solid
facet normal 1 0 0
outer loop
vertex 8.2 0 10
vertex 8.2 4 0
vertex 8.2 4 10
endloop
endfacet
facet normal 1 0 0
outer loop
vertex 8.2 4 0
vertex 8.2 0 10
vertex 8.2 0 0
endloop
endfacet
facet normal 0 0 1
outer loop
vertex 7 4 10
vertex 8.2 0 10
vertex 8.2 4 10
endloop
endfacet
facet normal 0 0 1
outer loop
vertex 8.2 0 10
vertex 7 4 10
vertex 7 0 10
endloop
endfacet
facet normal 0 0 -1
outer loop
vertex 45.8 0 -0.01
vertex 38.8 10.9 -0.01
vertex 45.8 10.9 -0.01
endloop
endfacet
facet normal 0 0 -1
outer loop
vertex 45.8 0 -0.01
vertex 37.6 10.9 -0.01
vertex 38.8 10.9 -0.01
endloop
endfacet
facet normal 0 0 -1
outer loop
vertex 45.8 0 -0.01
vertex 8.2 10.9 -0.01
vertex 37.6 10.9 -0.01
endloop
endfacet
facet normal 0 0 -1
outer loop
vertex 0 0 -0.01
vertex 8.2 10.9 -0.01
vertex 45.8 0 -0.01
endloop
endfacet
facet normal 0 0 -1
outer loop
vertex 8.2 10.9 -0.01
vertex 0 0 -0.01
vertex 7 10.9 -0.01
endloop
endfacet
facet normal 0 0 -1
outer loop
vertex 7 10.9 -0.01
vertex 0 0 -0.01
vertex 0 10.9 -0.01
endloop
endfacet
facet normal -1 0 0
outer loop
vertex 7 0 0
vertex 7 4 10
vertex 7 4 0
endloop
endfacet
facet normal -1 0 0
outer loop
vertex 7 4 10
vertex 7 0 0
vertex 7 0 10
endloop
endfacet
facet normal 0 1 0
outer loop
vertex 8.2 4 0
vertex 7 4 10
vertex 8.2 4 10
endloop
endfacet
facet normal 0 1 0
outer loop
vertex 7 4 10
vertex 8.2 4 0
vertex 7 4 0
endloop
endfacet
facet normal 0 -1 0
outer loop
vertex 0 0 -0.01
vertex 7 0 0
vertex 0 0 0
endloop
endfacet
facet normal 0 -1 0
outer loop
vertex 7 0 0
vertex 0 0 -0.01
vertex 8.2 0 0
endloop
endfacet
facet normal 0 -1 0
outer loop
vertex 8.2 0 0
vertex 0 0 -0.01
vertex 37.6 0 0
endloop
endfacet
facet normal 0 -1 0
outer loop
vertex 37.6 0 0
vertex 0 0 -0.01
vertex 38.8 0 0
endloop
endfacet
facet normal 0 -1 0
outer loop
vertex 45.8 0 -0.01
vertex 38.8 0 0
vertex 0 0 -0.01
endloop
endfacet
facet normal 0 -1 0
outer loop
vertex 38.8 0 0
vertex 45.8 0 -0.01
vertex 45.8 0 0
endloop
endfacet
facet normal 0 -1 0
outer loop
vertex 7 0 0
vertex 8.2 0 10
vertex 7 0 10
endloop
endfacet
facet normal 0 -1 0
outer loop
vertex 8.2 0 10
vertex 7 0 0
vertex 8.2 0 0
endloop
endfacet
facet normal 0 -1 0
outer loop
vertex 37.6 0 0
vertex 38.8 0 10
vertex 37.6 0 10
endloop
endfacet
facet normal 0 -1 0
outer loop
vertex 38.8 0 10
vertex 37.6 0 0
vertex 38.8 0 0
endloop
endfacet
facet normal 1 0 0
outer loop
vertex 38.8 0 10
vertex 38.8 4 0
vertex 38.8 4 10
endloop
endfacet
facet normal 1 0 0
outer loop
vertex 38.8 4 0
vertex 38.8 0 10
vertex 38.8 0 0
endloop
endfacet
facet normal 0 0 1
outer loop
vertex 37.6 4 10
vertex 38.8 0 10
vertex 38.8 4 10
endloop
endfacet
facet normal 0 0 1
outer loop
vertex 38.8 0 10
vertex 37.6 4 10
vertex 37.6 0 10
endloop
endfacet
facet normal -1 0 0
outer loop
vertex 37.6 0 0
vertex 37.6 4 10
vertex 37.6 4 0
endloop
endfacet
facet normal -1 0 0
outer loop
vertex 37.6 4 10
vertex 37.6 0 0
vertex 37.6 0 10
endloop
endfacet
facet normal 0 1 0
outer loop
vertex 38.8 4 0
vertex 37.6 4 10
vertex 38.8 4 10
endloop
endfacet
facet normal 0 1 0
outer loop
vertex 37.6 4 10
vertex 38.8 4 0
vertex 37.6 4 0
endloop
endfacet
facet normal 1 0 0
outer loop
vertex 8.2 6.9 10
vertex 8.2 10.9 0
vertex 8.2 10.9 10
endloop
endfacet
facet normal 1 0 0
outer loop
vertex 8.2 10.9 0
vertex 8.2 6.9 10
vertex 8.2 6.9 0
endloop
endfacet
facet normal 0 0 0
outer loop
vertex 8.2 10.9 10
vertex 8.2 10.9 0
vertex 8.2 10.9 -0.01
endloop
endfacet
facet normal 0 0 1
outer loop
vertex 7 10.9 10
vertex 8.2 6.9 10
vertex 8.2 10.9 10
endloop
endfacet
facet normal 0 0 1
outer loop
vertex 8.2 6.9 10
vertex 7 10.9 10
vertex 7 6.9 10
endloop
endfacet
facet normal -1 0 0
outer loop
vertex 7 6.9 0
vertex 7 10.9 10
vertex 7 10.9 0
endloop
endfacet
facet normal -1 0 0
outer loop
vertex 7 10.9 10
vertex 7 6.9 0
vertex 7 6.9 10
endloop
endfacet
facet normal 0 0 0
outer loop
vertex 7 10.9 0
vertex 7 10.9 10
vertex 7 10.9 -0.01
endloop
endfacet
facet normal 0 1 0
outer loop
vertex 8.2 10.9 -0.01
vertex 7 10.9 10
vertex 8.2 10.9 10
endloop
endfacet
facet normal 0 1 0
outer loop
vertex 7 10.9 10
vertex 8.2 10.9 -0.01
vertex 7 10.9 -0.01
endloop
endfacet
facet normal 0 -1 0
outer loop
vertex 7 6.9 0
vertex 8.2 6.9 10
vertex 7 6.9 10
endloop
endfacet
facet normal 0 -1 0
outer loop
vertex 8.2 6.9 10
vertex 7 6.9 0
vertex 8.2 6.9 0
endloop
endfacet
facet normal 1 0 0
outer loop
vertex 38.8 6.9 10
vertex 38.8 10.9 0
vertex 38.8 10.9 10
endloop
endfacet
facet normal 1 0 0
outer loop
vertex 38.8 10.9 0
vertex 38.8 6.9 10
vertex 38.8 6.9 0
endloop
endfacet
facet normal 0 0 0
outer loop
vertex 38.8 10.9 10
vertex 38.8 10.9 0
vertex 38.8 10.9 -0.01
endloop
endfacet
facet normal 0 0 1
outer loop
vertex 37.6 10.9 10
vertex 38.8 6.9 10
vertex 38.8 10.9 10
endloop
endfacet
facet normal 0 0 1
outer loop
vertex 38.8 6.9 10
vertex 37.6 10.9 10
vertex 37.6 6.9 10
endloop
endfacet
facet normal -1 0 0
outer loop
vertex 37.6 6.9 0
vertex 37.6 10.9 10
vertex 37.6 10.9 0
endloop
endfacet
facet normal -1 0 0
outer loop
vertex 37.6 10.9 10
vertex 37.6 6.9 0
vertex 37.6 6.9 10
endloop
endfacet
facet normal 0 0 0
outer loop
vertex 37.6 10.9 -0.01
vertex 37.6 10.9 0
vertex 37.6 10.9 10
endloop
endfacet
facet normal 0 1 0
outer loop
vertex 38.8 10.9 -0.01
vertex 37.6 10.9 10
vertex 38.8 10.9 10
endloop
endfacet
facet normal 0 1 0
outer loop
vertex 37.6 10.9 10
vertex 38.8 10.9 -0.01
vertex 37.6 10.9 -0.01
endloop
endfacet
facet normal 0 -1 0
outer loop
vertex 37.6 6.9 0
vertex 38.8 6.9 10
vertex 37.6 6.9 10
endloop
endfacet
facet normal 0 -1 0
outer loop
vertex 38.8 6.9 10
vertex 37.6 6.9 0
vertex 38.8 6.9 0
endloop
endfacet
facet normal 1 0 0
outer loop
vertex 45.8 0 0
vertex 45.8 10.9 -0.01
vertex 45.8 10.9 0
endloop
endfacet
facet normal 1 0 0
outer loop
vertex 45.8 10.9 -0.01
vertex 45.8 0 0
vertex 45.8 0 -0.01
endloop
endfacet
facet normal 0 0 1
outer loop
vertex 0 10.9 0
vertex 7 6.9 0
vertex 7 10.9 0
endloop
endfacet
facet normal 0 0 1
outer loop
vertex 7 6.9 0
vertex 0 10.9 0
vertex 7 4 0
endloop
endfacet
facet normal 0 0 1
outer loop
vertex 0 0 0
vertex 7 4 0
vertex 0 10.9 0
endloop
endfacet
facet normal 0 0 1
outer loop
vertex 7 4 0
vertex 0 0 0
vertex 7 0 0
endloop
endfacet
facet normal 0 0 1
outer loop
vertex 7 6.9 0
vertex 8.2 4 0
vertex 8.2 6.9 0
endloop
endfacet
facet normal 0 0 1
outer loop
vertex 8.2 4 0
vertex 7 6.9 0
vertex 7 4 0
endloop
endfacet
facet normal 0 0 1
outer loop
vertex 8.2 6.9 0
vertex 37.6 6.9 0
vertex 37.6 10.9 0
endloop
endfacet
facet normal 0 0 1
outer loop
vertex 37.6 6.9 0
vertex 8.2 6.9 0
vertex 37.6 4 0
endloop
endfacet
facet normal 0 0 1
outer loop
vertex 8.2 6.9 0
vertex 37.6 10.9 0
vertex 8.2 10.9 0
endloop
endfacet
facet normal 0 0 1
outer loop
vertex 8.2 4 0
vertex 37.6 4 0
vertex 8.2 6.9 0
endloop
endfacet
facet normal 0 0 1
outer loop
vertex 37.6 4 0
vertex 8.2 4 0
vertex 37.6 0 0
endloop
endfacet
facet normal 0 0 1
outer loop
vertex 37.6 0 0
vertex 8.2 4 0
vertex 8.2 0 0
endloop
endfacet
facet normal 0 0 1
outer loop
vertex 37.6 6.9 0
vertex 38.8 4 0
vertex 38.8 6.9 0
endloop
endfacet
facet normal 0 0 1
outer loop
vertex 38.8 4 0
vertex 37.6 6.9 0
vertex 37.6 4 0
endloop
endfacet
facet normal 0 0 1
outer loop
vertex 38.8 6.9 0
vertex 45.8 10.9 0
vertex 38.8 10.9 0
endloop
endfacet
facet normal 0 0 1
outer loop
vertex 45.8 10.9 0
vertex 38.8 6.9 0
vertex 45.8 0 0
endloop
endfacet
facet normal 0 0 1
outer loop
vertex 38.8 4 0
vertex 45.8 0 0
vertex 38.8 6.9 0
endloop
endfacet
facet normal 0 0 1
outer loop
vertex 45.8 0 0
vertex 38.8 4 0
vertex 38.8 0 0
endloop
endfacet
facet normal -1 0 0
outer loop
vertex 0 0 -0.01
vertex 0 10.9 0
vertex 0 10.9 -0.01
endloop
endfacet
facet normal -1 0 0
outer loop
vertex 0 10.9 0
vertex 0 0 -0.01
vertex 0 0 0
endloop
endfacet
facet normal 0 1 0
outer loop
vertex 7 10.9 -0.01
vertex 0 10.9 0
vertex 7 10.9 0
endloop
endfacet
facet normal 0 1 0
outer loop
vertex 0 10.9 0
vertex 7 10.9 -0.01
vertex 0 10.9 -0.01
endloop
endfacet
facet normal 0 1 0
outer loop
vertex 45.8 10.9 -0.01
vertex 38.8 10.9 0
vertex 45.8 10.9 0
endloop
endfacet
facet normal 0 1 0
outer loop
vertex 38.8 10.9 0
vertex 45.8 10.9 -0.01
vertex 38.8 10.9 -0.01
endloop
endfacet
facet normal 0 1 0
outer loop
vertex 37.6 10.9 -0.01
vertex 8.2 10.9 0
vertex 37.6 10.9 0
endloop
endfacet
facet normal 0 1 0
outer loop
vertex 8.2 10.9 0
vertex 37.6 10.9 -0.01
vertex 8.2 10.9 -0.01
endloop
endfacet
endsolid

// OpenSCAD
// file: ../Base/Boxes.scad
// Fischertechnik Box Foundation
// Pre-designed Boxes

use <Constants.scad>

include <PlacementOptions.scad>

box190Width = 190;
box190Depth = 130;
box130Width = 130;
box130Depth = 95;

// Values are from an original ec3 box
topBottomDifference = 1.5;
outerHeight = 40;
innerHeight = 38.2;
baseThickness = outerHeight - innerHeight;
stackExcess = 5.7;
radius = 3.5;
wallThickness = 1.5;
tolerance = 0.2;
stackOffset = innerHeight - stackExcess;

boxUsageHeight = stackOffset;
boxWallThickness = wallThickness;
boxBaseThickness = baseThickness;
boxWebWidth = 3.0;

// getBoxWallThickness()
// Gets the wall thickness of a Fischertechnik Box
function getBoxWallThickness() = boxWallThickness;

// getBoxUsageHeight()
// Gets the usable height of a Fischertechnik box
function getBoxUsageHeight() = boxUsageHeight;

// getBoxInnerHeight()
// Gets the inner height of a Fischertechnik box, including the stack excess
function getBoxInnerHeight() = innerHeight;

// getBoxBaseThickness()
// Gets the thickness of the Fischertechnik box base.
function getBoxBaseThickness() = boxBaseThickness;

// getBoxWebWidth()
// Gets the width of a box web
function getBoxWebWidth() = boxWebWidth;

// getBox190Space()
// Gets the usable inner space of a Box 190 as an x/y-list
function getBox190Space() = [
    box190Width - 2*getBoxWallThickness() - topBottomDifference, 
    box190Depth - 2*getBoxWallThickness() - topBottomDifference ];

// BoxBase(width, depth)
// Creates an empty stackable Fischertechnik compatible box
// width = Outer width of the box (190, 130, ...)
// depth = Outer depth of the box (130, 95, ...)

module BoxBase(width, depth, height=outerHeight) {    
    thinPlate = 0.01;

    innerHeight = height - baseThickness;    
    
    module BodyPlate(width, depth) {
        translate([radius, radius])
        hull() {
            w = width-2*radius;
            d = depth-2*radius;
            cube([w, d, thinPlate]);
            cylinder(thinPlate, r=radius, $fn=getFragments());
            translate([w, 0])
                cylinder(thinPlate, r=radius, $fn=getFragments());
            translate([w, d])
                cylinder(thinPlate, r=radius, $fn=getFragments());
            translate([0, d])
                cylinder(thinPlate, r=radius, $fn=getFragments());
        }
    }
    
    module Body(tolerance=tolerance) {
        hull() {
            // Bottom with tolerance to fit into the original boxes when stacked
            translate([-wallThickness+tolerance, -wallThickness+tolerance, -baseThickness])
                BodyPlate(width-topBottomDifference-2*tolerance, depth-topBottomDifference-2*tolerance);
            
            // Top
            translate([-wallThickness-topBottomDifference/2, -wallThickness-topBottomDifference/2, innerHeight-thinPlate])
                BodyPlate(width, depth);
         }
    }

    module Cutoff() {
        hull() {
            coWidth = width - 2*wallThickness;
            coDepth = depth - 2*wallThickness;
            
            // Bottom
            BodyPlate(coWidth-topBottomDifference, coDepth-topBottomDifference);

            // Top
            translate([-topBottomDifference/2, -topBottomDifference/2, innerHeight+thinPlate]) 
                BodyPlate(coWidth, coDepth);
        }
    }
    
    difference() {        
        Body();
        Cutoff();
        stackOffset = innerHeight - stackExcess;
        translate([0, 0, stackOffset + baseThickness])
            Body(tolerance=0);
    }
}

// Creates the Fischertechnik empty box 130x190 mm and places it at position 0,0
// 190x130 are the outer sizes, the inner space is slightly smaller. Use getBox190Space() to get the inner sizes.
// The box is positioned that the usable inner space is at the 0,0,0 position. The

module Box190() {
    BoxBase(box190Width, box190Depth);
}

// Gets the usable inner space of a Box 130 as an x/y-list
function getBox130Space() = [
    box130Width - 2*getBoxWallThickness() - topBottomDifference, 
    box130Depth - 2*getBoxWallThickness() - topBottomDifference ];

// Creates the Fischertechnik empty box 95x130 mm and places it at position 0,0
// 190x130 are the outer sizes, the inner space is slightly smaller. Use getBox190Space() to get the inner sizes.
// The box is positioned that the usable inner space is at the 0,0,0 position. The

module Box130() {
    BoxBase(box130Width, box130Depth);
}

// Creates a web at the specified box walls
// corner 0 = LowerLeft, 1 = UpperLeft, 2 = UpperRight, 3 = LowerRight
// side 0 = LeftOfCorner, 1 = RightOfCorner
// distance = Distance in mm from the corner
// boxSpace = inner width and depth of the box (default: Box 190)
// webWidth = length of the web (default is 3 mms)
// webThickness = thickness of the web (default is 1 mm)

module BoxWeb(corner, side, distance, boxSpace=getBox190Space(), webWidth=getBoxWebWidth(), webThickness=1.0) {
    sink = getBoxWallThickness()/2;

    width = (corner % 2 == 0) ? 
            (side == LeftOfCorner ? webWidth : webThickness) :
            (side == LeftOfCorner ? webThickness : webWidth);

    depth = (corner % 2 == 0) ? 
            (side == RightOfCorner ? webWidth : webThickness) :
            (side == RightOfCorner ? webThickness : webWidth);
    
    xDiff = corner == LowerLeft ? 
                (side == LeftOfCorner ? -sink : distance) :
            (corner == UpperLeft ?                
                (side == LeftOfCorner ? distance : -sink) :
            (corner == UpperRight ?
                (side == LeftOfCorner ? boxSpace.x-webWidth+sink : boxSpace.x-distance-webThickness) :
                (side == LeftOfCorner ? boxSpace.x-distance-webThickness: boxSpace.x-webWidth+sink)));

    yDiff = corner == LowerLeft ? 
                (side == RightOfCorner ? -sink : distance) :
            (corner == UpperLeft ?
                (side == RightOfCorner ? boxSpace.y-distance : boxSpace.y-webWidth+sink) :
            (corner == UpperRight ?
                (side == RightOfCorner ? boxSpace.y-webWidth+sink : boxSpace.y-distance) :
                (side == RightOfCorner ? distance : -sink)));
    
    translate([xDiff, yDiff, -getExcess()])
        cube([width, depth, boxUsageHeight + 2*getExcess()]);
}
// file: ../Base/Rotation.scad
// Fischertechnik Box Foundation
// Geometry Helpers Rotation

include <PlacementOptions.scad>

// getRotatedSpace(space, rotation=NoRotation)
// Rotates the space dependent on the specified rotation

function getRotatedSpace(space, rotation=NoRotation) = [
    (rotation == Rotate90 || rotation == Rotate270) ? space.y : space.x,
    (rotation == Rotate90 || rotation == Rotate270) ? space.x : space.y
];

// Rotates the given space around the fixed left lower corner
// space = the space the children needs as width/depth list [width,depth]
// rotation = 0 Rotate0 degrees, 1 Rotate90 degrees, 2 Rotate180 degrees, 3 Rotate270 degrees (equivalent to -90)

module RotateFix(space, rotation=NoRotation) {
    dy = (rotation == Rotate0 || rotation == Rotate270) ? 0 :
        (rotation == Rotate90) ? space.x :
        space.y;
    dx = (rotation < Rotate180) ? 0 :
        (rotation == Rotate180) ? space.x :
        space.y;
    
    translate([dx, dy, 0])
        rotate([0, 0, rotations[rotation]])
            children();
}
// file: ../Base/Alignment.scad
// Fischertechnik Box Foundation
// Geometry Helpers Alignment

include <PlacementOptions.scad>

// getAlignedX(elementWidth, spaceWidth, align=AlignRight, offset=0)
// Gets the aligned X offset of an element with the given
// width in the given space.
// elementWidth = The width of the element to positon
// spaceWidth = The space where the element should be aligned
// align = 0 AlignLeft, 1 AlignCenter, 2 AlignRight
// offset = an optional offset from the aligned position. When
// aligned left or centered, then positive values are in X direction.
// When aligned right then positive values are in negative X direction.

function getAlignedX(elementWidth, spaceWidth, align=AlignRight, offset=0) =
    (align == AlignLeft) ?
        offset :
        ((align == AlignCenter) ?
        (spaceWidth - elementWidth)/2 + offset :
        spaceWidth - offset - elementWidth);

// getAlignedY(elementDepth, spaceDepth, align=AlignTop, offset=0)
// Gets the aligned Y offset of an element with the given
// depth in the given space.
// elementDepth = The depth of the element to positon
// spaceDepth = The space where the element should be aligned
// align = 0 AlignBottom, 1 AlignCenter, 2 AlignTop
// offset = an optional offset from the aligned position. When
// aligned bottom or centered, then positive values are in Y direction.
// When aligned top then positive values are in negative Y direction.

function getAlignedY(elementDepth, spaceDepth, align=AlignTop, offset=0) =
    (align == AlignBottom) ?
        offset :
        ((align == AlignCenter) ?
        (spaceDepth - elementDepth)/2 + offset :
        spaceDepth - offset - elementDepth);
// file: ../Base/PlacementOptions.scad
// Fischertechnik Box Foundation
// Placement Options

// Alignment
NoAlign = 0;
AlignLeft = 1;
AlignBottom = 2;
AlignCenter = 3;
AlignRight = 4;
AlignTop = 5;

// Element rotation degree steps
rotations = [0, -90, -180, -270];

// Rotation
NoRotation = 0;
Rotate0 = 0;
Rotate90 = 1;
Rotate180 = 2;
Rotate270 = 3;

// Docking (seen from above)
NoDock = -1;
DockLeft = 0;
DockTop = 1;
DockRight = 2;
DockCorner = 2;
DockBottom = 3;

// Web corners
LowerLeft = 0;
UpperLeft = 1;
UpperRight = 2;
LowerRight = 3;

// Web position relative to corner
LeftOfCorner = 0;
RightOfCorner = 1;
// file: ../Base/Placement.scad
// Fischertechnik Box Foundation
// Geometry Helpers Placement

use <Constants.scad>
use <Alignment.scad>
use <Rotation.scad>
use <Boxes.scad>

include <PlacementOptions.scad>

// Place(x=0, y=0, elementSpace=[0,0], alignX=AlignLeft, alignY=AlignBottom, rotation=Rotate0, boxSpace=getBox190Space())
// Places the child at the specified position
// y = Y-Position. This is a relative position when an X aligment is specified.
// x = X-Position. This is a relative position when an Y aligment is specified.
// elementSpace = space of the element to be placed [x,y]
// alignX = -1=NoAlign, 0 AlignLeft, 1 AlignCenter, 3 AlignRight (elementSpace and boxSpace required!)
// alignY = -1=NoAlign, 2 AlignBottom, 1 AlignCenter, 4 AlignTop (elementSpace and boxSpace required!)
// rotation = 0 Rotate0 0 degrees, 1 Rotate90 90 degrees, 
// 2 Rotate180 180 degrees, 3 Rotate270 270 degrees (equivalent to -90)
// boxSpace = Inner space of the box where the placement occurs [x,y] - default is Box 190x130 inner space

module Place(x=0, y=0, elementSpace=[0,0], 
  alignX=AlignLeft, alignY=AlignBottom, 
  rotation=NoRotation, boxSpace=getBox190Space()) {

    module Position(x, y, space, rotation=Rotate0) {
        translate([x, y, 0])
            RotateFix(space, rotation)
                children();
    }

    space = getRotatedSpace(elementSpace, rotation);
    alignedX = getAlignedX(space.x, boxSpace.x, alignX, x);
    alignedY = getAlignedY(space.y, boxSpace.y, alignY, y);
    Position(alignedX, alignedY, elementSpace, rotation)
        children();
}

// Center(space=getBox130Space(), elementSpace=[0,0])
// space = Space where the children is centered. For cylinder use centered=true and no elementSpace.
// elementSpace = space of the element to be centered [x,y]

module Center(space=getBox190Space(), elementSpace=[0,0]) {
    Place(elementSpace=elementSpace, boxSpace=space, alignX=AlignCenter, alignY=AlignCenter)
        children();
}

// CenterHorizontal(width=0, y=0, offset=0, space=getBox130Space())
// width = Width of the element to be placed.
// y = Y position of the element
// offset = Offset from the center position (negative will be left of the center)
// space = Space where the element is placed

module CenterHorizontal(width=0, y=0, offset=0, space=getBox190Space()) {
    Place(x=offset, y=y, elementSpace=[width, 0], boxSpace=space, alignX=AlignCenter)
        children(0);
}

// CenterVertical(depth=0, x=0, offset=0, space=getBox130Space())
// depth = Depth of the element to be placed.
// x = X position of the element
// offset = Offset from the center position (negative will be down of the center)
// space = Space where the element is placed

module CenterVertical(depth=0, x=0, offset=0, space=getBox190Space()) {
    Place(x=x, y=offset, elementSpace=[0, depth], boxSpace=space, alignY=AlignCenter)
        children(0);
}

// getIsVertical(align)
// True if the specified alignment needs a vertical orientation for a divider (AlignRight, AlignLeft)

function getIsVertical(align) = (align == AlignRight || align == AlignLeft);

// getIsHorizontal(align)
// True if the specified alignment needs a horizontal orientation for a divider (AlignTop, AlignBottom)

function getIsHorizontal(align) = (align == AlignTop || align == AlignBottom);
// file: ../Base/Constants.scad
// Fischertechnik Box Foundation
// Constants

// Constant values necessary for multiple elements

// Base constants
dividerThickness = 1.2;
excess = 0.01;
fragments = 90;
tolerance = 0.8;

// Gets the thickness of a divider 
function getDividerThickness() = dividerThickness;

// Gets the excess that is used to merge walls into each other
function getExcess() = excess;

// Gets amount of fragments of a cylinder
function getFragments() = fragments;

// Gets the inner tolerance of a frame to each side
function getTolerance() = tolerance;


// Fischertechnik specific constants
axisDiameter = 4;
axisBottomDiameter = axisDiameter + 1;
standardEdgeDistance = 2.5;
standardWebDistance = 11.5;
standardCornerLength = 15;
tubeWallFactor = 0.8;
smallPartsFrameHeight = 20;

// Gets axis diameter
function getAxisDiameter() = axisDiameter;

// Gets axis bottom diameter for thicker part at the bottom
function getAxisBottomDiameter() = axisBottomDiameter;

// gets the standard distance to the wall of the box for dockable frames with webs
function getStandardEdgeDistance() = standardEdgeDistance;

// gets the standard distance of each web to the corner of the dockable frame
function getStandardWebDistance() = standardWebDistance;

// gets the standard length of the corner walls of a dockable frame
function getStandardCornerLength() = standardCornerLength;

// gets the wall thickness of a tube.
function getTubeWallThickness() = tubeWallFactor * getDividerThickness();

// gets the frame height for docked small parts boxes.
function getSmallPartsFrameHeight() = smallPartsFrameHeight;
// main file
// Fischertechnik Box Library
// Holder for Building Plate 30x45
// 38259

use <../ModelBase/Complex.scad>

/* [Element Parameters] */
count = 1;
dock = false;

/* [Hidden] */
width = 45;

// getHolderBuildingPlate30x45Space(count = 1)
// Gets the width (.x) and depth (.y) space the holder needs.

function getHolderBuildingPlate30x45Space(count = 1) = getHolderBuildingPlateSpace(width, count);

// HolderBuildingPlate30x45(count=1, dock=false)
// Holder for building plates 45x30
// count = Count of building plates (default 1)
// dock = true if the holders are docked to the box wall (default false) 

module HolderBuildingPlate30x45(count = 1, dock = false) {
    HolderBuildingPlate(width, count, dock);
}

// Test
color("lightgray")
HolderBuildingPlate30x45(count, dock);
